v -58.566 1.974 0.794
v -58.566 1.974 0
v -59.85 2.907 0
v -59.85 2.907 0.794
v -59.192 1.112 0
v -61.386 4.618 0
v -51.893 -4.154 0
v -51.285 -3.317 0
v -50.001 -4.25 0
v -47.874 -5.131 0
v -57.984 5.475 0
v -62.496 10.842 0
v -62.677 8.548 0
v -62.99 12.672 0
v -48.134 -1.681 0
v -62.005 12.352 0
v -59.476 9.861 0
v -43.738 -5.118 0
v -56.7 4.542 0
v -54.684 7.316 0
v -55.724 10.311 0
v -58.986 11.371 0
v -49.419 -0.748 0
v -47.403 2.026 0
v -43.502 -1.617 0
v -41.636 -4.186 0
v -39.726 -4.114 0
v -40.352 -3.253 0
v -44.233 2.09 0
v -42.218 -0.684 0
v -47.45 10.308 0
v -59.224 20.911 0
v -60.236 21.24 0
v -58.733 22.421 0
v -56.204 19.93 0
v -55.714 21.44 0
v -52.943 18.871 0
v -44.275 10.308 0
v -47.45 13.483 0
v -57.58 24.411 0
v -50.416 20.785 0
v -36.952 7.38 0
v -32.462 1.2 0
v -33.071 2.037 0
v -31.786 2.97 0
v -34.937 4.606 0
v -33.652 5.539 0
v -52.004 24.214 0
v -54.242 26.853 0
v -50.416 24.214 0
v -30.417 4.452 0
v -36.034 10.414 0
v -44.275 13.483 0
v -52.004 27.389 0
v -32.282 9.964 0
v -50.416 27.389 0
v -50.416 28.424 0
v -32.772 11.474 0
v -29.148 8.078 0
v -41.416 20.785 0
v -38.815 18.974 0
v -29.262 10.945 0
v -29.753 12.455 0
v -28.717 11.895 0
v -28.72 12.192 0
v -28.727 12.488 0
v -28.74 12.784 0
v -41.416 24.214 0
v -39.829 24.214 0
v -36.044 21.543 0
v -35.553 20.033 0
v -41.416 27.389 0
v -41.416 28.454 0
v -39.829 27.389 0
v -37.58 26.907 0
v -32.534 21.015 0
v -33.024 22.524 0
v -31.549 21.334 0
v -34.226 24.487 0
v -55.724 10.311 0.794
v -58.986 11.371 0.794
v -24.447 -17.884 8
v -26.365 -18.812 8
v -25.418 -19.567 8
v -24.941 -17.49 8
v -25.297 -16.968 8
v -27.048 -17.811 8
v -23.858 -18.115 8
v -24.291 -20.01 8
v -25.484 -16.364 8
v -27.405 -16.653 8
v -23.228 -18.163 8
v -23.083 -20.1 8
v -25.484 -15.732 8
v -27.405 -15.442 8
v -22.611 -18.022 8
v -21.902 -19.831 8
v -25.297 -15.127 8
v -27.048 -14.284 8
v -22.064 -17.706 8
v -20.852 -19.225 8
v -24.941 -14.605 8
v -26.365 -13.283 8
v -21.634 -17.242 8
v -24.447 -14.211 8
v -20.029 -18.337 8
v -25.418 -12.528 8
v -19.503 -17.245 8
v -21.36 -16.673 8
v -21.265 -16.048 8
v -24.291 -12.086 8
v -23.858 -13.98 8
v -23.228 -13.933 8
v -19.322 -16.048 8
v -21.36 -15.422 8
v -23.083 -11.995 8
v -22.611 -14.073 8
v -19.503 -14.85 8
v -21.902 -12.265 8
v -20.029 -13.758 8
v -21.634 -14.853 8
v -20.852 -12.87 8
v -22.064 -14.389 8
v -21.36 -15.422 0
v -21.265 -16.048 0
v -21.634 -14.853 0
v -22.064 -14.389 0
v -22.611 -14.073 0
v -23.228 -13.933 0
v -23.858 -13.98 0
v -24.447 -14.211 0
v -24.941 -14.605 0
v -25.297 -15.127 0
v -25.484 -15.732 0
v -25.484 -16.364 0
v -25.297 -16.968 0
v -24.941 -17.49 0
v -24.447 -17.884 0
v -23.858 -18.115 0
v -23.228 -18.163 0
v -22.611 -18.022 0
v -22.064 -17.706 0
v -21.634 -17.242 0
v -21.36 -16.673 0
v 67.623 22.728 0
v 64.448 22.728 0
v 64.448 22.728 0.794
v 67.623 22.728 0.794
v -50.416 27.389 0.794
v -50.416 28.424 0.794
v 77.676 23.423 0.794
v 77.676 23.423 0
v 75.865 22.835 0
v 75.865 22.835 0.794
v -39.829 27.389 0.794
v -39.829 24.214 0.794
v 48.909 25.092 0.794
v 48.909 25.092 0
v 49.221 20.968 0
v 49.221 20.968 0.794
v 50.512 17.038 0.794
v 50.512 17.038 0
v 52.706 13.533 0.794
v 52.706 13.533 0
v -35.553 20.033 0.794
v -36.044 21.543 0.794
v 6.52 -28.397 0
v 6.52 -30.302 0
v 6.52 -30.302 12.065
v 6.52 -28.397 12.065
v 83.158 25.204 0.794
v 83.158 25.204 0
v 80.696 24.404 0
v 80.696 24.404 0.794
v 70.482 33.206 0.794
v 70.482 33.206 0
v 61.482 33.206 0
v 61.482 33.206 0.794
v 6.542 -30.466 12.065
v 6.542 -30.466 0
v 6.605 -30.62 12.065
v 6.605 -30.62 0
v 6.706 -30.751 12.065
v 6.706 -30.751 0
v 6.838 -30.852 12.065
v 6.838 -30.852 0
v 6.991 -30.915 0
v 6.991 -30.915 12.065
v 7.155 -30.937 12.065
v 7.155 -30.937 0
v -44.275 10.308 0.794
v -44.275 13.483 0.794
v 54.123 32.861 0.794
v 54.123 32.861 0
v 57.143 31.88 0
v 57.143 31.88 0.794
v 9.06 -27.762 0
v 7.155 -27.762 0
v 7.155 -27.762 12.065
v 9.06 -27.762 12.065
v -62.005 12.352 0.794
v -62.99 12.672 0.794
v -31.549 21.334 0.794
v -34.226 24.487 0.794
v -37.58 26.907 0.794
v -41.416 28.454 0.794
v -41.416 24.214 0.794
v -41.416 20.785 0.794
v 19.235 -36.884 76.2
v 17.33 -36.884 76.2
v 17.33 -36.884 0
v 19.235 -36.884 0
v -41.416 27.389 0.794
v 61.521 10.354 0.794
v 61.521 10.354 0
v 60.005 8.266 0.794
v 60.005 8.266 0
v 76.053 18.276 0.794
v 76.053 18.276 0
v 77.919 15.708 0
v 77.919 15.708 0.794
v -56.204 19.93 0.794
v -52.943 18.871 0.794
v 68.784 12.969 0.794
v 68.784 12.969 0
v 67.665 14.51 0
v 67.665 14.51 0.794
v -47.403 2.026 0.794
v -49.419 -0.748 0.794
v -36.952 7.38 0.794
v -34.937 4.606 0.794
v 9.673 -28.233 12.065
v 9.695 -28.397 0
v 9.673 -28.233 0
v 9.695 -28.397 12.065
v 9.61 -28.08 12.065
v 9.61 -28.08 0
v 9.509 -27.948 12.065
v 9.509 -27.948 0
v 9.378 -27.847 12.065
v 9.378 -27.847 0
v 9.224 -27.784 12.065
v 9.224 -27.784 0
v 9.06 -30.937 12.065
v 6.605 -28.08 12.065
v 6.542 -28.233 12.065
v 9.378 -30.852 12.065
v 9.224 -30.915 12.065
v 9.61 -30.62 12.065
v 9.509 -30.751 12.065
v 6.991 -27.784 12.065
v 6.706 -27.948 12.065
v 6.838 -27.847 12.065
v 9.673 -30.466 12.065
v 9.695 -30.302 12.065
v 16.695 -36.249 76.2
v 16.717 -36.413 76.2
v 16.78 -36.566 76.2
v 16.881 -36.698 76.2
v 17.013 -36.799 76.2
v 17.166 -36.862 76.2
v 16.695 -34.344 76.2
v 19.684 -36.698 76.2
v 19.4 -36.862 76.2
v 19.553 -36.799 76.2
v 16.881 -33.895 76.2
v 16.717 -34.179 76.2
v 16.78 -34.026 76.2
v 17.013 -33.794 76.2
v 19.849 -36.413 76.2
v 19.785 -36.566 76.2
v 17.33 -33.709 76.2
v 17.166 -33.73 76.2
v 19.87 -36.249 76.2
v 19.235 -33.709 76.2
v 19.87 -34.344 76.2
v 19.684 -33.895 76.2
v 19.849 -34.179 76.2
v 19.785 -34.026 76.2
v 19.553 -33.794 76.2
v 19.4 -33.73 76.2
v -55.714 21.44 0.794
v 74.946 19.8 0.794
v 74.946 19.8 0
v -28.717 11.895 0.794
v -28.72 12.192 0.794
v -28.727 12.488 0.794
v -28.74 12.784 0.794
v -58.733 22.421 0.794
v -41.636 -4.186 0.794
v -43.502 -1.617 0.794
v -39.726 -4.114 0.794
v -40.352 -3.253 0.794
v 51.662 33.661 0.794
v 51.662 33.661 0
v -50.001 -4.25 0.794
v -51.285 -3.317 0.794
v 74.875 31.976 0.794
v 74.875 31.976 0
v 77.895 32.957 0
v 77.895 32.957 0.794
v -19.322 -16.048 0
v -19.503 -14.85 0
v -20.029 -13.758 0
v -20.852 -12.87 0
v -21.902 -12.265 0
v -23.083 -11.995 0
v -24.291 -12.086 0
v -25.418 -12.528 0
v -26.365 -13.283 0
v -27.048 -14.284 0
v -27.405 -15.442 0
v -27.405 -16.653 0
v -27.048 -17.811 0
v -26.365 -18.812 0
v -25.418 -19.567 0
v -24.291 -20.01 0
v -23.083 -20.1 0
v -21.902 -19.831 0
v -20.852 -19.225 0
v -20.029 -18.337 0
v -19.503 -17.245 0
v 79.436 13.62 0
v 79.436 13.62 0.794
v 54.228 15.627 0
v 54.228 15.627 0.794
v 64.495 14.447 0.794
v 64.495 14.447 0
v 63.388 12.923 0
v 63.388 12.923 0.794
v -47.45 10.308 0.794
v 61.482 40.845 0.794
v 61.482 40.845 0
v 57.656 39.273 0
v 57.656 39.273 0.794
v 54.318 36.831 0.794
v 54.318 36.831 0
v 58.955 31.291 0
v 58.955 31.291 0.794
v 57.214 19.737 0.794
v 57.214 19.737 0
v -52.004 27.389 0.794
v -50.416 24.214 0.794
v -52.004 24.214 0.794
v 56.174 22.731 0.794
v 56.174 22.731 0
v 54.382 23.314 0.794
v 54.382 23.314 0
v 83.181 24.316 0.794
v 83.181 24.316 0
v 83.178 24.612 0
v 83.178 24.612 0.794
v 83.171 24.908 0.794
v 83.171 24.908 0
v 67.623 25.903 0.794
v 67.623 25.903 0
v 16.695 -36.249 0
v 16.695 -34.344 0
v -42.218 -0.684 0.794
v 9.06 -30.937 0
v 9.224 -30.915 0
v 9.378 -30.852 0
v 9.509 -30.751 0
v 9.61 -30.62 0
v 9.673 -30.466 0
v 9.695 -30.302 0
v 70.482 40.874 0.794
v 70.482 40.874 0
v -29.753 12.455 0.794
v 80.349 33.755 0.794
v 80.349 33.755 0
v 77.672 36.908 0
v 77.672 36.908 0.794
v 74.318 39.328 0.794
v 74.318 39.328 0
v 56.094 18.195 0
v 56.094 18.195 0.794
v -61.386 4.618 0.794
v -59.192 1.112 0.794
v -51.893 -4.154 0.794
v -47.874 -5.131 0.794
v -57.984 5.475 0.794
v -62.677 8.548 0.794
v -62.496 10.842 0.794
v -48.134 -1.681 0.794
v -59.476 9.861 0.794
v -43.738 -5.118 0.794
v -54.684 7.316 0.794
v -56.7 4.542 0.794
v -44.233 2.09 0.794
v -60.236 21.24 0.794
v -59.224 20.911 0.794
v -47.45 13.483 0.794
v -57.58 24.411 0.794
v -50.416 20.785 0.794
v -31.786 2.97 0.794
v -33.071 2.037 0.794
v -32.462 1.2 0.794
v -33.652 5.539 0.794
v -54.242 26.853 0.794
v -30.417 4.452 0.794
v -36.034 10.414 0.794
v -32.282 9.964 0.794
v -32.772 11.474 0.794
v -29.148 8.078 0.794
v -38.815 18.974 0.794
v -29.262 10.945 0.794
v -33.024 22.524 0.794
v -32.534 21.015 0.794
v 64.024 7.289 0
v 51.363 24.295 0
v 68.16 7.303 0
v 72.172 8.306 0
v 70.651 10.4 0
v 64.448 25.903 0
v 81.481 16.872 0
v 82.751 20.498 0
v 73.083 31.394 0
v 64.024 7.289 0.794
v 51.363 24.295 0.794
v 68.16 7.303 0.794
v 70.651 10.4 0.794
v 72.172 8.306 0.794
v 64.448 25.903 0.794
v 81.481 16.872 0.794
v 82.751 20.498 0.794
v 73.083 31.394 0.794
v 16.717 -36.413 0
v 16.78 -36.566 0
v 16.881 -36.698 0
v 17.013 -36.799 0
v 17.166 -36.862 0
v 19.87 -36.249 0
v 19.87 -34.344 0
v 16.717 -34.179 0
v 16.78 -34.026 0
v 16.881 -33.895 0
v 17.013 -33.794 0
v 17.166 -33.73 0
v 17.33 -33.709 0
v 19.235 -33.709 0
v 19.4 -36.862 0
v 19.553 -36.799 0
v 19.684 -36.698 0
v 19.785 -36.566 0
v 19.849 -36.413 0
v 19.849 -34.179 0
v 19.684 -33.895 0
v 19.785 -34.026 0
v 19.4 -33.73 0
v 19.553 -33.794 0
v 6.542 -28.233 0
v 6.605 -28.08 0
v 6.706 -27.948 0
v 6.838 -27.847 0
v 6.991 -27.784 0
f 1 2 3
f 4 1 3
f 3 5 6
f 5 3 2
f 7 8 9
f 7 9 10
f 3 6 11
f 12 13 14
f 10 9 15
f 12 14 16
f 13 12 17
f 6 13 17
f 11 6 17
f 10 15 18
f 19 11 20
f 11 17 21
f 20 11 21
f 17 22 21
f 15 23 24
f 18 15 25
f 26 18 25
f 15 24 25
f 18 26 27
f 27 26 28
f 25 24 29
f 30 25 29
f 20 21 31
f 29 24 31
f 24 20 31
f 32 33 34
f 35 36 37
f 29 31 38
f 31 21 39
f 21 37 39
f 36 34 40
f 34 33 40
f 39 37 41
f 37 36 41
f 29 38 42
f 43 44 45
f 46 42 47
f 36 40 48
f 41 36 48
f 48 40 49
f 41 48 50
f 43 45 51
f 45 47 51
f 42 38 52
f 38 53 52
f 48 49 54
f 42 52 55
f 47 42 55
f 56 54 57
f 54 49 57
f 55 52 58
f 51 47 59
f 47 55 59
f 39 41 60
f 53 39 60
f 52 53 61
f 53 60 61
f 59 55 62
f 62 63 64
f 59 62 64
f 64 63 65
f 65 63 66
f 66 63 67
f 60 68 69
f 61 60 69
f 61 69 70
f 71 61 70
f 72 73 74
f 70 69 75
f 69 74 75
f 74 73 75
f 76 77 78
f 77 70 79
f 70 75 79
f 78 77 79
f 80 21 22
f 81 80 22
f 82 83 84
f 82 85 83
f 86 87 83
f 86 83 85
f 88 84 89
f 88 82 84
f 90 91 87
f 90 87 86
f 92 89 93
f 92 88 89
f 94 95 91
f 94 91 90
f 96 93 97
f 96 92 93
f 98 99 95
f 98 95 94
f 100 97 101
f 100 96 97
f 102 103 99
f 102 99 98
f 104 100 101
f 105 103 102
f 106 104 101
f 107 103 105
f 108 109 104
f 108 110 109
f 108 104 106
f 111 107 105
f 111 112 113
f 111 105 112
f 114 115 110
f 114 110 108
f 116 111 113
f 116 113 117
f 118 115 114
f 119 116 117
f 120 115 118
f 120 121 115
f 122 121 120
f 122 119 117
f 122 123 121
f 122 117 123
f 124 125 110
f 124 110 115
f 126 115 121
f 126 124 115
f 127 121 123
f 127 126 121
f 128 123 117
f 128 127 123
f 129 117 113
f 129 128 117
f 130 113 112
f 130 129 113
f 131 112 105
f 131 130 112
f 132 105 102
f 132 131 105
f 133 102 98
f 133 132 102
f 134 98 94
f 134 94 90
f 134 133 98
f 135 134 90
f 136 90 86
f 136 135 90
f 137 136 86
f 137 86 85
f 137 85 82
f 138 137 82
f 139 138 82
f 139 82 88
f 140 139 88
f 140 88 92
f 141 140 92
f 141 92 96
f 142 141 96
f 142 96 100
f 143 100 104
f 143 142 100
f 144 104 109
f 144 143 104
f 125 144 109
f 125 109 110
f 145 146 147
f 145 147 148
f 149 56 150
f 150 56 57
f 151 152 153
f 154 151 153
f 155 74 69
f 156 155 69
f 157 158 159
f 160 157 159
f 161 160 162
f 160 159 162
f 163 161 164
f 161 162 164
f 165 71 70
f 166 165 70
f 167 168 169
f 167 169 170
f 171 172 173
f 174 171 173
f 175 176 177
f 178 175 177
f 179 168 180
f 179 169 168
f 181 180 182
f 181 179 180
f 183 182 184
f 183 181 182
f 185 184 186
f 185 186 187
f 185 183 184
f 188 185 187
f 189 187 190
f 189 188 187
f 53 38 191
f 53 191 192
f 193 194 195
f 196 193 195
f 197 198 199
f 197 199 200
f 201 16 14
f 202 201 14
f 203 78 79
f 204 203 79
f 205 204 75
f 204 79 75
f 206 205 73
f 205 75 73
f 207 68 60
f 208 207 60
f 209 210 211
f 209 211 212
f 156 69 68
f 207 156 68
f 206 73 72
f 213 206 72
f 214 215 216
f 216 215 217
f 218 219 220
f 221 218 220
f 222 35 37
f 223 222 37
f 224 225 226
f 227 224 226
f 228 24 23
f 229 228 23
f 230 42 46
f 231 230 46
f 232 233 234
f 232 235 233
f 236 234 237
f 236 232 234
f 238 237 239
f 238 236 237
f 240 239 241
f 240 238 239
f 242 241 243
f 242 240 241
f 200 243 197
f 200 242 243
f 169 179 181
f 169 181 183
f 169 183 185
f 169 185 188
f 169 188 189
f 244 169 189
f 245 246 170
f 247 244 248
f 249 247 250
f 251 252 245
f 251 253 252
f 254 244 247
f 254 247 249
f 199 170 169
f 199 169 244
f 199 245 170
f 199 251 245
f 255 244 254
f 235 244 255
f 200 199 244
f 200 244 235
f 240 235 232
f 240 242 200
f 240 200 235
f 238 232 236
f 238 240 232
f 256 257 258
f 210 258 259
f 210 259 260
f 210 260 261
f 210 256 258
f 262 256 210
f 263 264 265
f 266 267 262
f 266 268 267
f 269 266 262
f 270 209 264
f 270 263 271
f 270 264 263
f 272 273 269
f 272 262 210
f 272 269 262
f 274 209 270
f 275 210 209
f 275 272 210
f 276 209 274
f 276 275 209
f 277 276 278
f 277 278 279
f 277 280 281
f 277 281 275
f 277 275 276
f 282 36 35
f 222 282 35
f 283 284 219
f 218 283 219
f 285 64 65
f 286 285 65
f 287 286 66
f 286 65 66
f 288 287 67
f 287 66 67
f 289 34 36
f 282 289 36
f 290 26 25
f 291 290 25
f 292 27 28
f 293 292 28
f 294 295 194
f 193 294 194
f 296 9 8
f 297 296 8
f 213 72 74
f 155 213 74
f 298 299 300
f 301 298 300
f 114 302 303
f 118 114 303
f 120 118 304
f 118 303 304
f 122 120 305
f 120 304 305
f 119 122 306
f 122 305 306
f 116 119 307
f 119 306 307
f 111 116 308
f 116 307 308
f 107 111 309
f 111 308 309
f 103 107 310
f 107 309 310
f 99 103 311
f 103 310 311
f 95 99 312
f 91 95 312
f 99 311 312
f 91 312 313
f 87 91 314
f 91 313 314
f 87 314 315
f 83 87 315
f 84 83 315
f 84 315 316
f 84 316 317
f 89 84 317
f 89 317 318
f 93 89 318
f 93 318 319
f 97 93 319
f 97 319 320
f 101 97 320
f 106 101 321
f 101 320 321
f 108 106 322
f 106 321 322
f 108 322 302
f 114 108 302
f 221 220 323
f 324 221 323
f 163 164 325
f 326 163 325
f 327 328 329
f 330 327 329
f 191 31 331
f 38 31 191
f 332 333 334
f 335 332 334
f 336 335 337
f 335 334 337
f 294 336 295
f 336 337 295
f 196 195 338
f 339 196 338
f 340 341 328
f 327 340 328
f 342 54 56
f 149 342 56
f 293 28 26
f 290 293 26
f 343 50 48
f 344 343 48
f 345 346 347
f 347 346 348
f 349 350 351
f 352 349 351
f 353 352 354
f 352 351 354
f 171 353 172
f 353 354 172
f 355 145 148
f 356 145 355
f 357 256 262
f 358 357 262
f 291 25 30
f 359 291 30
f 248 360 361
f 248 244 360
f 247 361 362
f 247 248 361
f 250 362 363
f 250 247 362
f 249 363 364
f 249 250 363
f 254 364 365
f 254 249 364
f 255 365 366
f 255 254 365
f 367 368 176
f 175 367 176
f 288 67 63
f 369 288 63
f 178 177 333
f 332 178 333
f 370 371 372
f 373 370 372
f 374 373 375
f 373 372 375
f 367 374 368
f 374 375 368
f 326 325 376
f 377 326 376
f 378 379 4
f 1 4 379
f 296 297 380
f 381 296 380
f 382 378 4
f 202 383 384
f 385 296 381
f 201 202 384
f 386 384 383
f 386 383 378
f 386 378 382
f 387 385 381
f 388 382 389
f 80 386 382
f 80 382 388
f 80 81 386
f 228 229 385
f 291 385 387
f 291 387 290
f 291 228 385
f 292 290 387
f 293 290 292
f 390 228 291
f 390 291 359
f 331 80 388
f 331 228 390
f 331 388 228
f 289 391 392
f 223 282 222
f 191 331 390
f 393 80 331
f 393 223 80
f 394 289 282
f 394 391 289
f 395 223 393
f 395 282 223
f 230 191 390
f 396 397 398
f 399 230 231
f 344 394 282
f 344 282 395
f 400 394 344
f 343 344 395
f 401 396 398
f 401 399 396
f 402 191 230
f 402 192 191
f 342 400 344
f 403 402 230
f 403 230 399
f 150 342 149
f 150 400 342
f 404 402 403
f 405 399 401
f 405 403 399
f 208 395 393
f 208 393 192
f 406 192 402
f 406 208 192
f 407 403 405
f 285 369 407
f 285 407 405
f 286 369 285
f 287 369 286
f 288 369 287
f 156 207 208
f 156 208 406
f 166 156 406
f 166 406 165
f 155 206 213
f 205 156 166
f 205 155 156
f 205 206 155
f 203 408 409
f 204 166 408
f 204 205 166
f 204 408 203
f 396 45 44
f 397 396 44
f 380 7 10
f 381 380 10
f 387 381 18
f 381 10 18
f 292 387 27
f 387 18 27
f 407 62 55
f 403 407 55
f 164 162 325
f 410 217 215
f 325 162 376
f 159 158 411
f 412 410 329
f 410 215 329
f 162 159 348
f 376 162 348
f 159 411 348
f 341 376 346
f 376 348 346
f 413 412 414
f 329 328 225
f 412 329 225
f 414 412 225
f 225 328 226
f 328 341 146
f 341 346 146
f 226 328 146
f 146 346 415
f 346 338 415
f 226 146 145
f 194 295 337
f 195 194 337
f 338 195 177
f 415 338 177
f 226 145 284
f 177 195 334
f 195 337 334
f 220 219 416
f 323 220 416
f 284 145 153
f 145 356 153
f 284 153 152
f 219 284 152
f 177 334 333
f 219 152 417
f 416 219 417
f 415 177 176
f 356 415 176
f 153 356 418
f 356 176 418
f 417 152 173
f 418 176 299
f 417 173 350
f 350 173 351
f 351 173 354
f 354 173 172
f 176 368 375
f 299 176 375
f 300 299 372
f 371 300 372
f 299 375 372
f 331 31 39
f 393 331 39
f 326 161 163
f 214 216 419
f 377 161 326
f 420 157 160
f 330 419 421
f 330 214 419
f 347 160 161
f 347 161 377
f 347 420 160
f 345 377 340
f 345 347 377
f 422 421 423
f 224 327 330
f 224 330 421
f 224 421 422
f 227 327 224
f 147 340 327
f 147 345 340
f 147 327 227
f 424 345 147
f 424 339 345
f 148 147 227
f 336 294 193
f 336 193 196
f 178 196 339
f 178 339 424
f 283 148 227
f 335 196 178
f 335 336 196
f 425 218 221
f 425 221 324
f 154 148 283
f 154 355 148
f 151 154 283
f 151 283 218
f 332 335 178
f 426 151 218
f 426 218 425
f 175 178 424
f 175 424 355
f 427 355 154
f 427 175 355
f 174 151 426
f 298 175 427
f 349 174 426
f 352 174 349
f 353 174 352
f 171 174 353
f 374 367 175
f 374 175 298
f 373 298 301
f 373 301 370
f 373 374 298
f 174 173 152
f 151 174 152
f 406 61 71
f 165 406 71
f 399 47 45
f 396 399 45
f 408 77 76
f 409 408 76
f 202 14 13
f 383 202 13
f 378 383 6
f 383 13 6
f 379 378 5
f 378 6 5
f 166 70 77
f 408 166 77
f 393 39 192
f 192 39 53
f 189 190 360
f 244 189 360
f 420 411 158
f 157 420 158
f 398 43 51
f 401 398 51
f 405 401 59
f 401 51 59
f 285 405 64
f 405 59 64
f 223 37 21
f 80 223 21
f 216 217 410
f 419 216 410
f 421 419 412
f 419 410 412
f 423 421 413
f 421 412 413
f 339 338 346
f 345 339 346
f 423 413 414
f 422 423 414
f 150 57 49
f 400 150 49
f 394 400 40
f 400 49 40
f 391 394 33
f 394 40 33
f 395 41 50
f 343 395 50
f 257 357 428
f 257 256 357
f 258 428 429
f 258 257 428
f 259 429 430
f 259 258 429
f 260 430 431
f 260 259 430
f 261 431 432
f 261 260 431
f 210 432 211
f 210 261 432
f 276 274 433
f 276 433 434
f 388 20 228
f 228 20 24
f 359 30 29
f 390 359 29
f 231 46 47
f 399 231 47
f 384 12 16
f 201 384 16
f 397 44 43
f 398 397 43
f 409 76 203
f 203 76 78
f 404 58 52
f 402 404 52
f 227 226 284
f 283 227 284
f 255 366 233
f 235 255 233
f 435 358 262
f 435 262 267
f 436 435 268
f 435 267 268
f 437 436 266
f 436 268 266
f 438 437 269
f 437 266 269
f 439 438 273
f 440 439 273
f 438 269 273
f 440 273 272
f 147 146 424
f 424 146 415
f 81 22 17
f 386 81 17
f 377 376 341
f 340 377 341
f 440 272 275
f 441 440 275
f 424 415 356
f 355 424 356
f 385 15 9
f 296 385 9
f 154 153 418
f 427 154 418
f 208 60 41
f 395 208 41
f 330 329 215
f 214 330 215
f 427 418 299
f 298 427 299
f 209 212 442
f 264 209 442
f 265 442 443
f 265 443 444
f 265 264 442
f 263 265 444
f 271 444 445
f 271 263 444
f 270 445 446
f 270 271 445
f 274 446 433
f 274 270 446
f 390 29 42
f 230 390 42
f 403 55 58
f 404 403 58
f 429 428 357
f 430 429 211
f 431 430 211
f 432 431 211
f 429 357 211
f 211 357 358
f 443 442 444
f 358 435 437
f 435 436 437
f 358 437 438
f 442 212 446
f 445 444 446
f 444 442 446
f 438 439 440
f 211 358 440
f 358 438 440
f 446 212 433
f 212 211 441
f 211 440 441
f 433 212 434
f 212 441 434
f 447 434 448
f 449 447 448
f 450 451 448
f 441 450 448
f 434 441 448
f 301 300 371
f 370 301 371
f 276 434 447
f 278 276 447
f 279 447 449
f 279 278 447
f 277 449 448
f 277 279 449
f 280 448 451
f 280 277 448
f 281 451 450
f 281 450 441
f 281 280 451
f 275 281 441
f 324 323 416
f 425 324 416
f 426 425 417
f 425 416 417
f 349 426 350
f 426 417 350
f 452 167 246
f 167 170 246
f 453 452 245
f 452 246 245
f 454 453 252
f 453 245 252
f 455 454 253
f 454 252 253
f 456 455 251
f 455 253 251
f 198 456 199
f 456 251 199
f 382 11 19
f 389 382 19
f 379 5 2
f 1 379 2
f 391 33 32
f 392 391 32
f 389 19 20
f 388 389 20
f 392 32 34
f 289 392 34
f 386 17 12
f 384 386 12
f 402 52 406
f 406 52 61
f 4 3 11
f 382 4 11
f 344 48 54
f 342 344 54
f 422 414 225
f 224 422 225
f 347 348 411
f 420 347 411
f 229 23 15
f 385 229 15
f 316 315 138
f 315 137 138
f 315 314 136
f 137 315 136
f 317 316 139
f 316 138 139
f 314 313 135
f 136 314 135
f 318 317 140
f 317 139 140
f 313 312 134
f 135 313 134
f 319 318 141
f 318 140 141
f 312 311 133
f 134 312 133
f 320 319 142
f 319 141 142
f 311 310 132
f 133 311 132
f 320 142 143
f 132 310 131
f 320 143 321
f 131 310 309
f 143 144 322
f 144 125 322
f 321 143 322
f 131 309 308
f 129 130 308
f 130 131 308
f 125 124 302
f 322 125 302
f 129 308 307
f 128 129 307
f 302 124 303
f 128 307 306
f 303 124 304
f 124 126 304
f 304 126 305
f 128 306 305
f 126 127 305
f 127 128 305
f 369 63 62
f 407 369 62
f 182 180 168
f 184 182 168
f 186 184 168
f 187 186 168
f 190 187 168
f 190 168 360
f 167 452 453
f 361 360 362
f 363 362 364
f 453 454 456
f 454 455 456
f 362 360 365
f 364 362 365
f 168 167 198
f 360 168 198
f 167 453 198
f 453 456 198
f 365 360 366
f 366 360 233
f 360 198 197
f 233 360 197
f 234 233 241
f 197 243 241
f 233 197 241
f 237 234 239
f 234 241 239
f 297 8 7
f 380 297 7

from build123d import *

# Parameters (mm, degrees)
F0_W     = 3.175
F0_H     = 3.175
F0_W_2   = 1.5875
F1_DEPTH = 0.79375
F0_R     = 4.064
F0_R_2   = 2.1209
F2_DEPTH = 8
F3_DEPTH = 12.065
F4_DEPTH = 76.2
F5_R     = 0.635
F5_2_R   = 0.635


with BuildPart() as f1:
    # F0 (on Top) → F1 (new body)
    with BuildSketch(Plane.XY):
        with BuildLine():
            ThreePointArc((79.4359174406, 13.620231622), (82.2176024045, 18.6495635805), (83.1809139002, 24.3156011863))
            ThreePointArc((83.1809139002, 24.3156011863), (83.1751506376, 24.7601110941), (83.1578647245, 25.2043221595))
            Line((83.1578647245, 25.2043221595), (80.6959857074, 24.4044091771))
            Line((80.6959857074, 24.4044091771), (81.186550186, 22.8946069574))
            Line((81.186550186, 22.8946069574), (78.1669457467, 21.9134780003))
            Line((78.1669457467, 21.9134780003), (77.6763812682, 23.4232802199))
            Line((77.6763812682, 23.4232802199), (75.8645369763, 22.834576323))
            Line((75.8645369763, 22.834576323), (73.0833840269, 31.3940849696))
            Line((73.0833840269, 31.3940849696), (74.8750347538, 31.9762275796))
            Line((74.8750347538, 31.9762275796), (74.3844702753, 33.4860297992))
            Line((74.3844702753, 33.4860297992), (77.4040747145, 34.4671587563))
            Line((77.4040747145, 34.4671587563), (77.8946391931, 32.9573565367))
            Line((77.8946391931, 32.9573565367), (80.3486436372, 33.7547109153))
            ThreePointArc((80.3486436372, 33.7547109153), (76.0679539826, 38.2191689581), (70.481663809, 40.8741739734))
            Line((70.481663809, 40.8741739734), (70.481663809, 38.2856011863))
            Line((70.481663809, 38.2856011863), (72.069163809, 38.2856011863))
            Line((72.069163809, 38.2856011863), (72.069163809, 35.1106011863))
            Line((72.069163809, 35.1106011863), (70.481663809, 35.1106011863))
            Line((70.481663809, 35.1106011863), (70.481663809, 33.2055153572))
            Line((70.481663809, 33.2055153572), (61.481663809, 33.2055153572))
            Line((61.481663809, 33.2055153572), (61.481663809, 35.0893684155))
            Line((61.481663809, 35.0893684155), (59.894163809, 35.0893684155))
            Line((59.894163809, 35.0893684155), (59.894163809, 38.2643684155))
            Line((59.894163809, 38.2643684155), (61.481663809, 38.2643684155))
            Line((61.481663809, 38.2643684155), (61.481663809, 40.8446613866))
            ThreePointArc((61.481663809, 40.8446613866), (55.9129060448, 38.1530770023), (51.661587625, 33.6606410007))
            Line((51.661587625, 33.6606410007), (54.1234666421, 32.8607280183))
            Line((54.1234666421, 32.8607280183), (54.6140311207, 34.3705302379))
            Line((54.6140311207, 34.3705302379), (57.6336355599, 33.3894012808))
            Line((57.6336355599, 33.3894012808), (57.1430710814, 31.8795990611))
            Line((57.1430710814, 31.8795990611), (58.9549153732, 31.2908951642))
            Line((58.9549153732, 31.2908951642), (56.1737624238, 22.7313865175))
            Line((56.1737624238, 22.7313865175), (54.3821116969, 23.3135291275))
            Line((54.3821116969, 23.3135291275), (53.8915472184, 21.8037269079))
            Line((53.8915472184, 21.8037269079), (50.8719427791, 22.784855865))
            Line((50.8719427791, 22.784855865), (51.3625072577, 24.2946580846))
            Line((51.3625072577, 24.2946580846), (48.9085028136, 25.0920124632))
            ThreePointArc((48.9085028136, 25.0920124632), (49.7475108948, 18.9640637873), (52.7063417879, 13.5325806306))
            Line((52.7063417879, 13.5325806306), (54.2278666967, 15.6267800066))
            Line((54.2278666967, 15.6267800066), (52.9435522181, 16.5598890946))
            Line((52.9435522181, 16.5598890946), (54.8097703941, 19.1285180518))
            Line((54.8097703941, 19.1285180518), (56.0940848727, 18.1954089638))
            Line((56.0940848727, 18.1954089638), (57.2138662274, 19.7366557752))
            Line((57.2138662274, 19.7366557752), (64.4950191768, 14.4465885046))
            Line((64.4950191768, 14.4465885046), (63.3877181316, 12.9225193655))
            Line((63.3877181316, 12.9225193655), (64.6720326102, 11.9894102775))
            Line((64.6720326102, 11.9894102775), (62.8058144341, 9.4207813203))
            Line((62.8058144341, 9.4207813203), (61.5214999556, 10.3538904083))
            Line((61.5214999556, 10.3538904083), (60.0048418006, 8.2663895443))
            ThreePointArc((60.0048418006, 8.2663895443), (66.0921350758, 7.1706933656), (72.1721115545, 8.306288167))
            Line((72.1721115545, 8.306288167), (70.6505866457, 10.400487543))
            Line((70.6505866457, 10.400487543), (69.3662721672, 9.467378455))
            Line((69.3662721672, 9.467378455), (67.5000539911, 12.0360074122))
            Line((67.5000539911, 12.0360074122), (68.7843684697, 12.9691165002))
            Line((68.7843684697, 12.9691165002), (67.664587115, 14.5103633117))
            Line((67.664587115, 14.5103633117), (74.9457400644, 19.8004305823))
            Line((74.9457400644, 19.8004305823), (76.0530411096, 18.2763614432))
            Line((76.0530411096, 18.2763614432), (77.3373555881, 19.2094705312))
            Line((77.3373555881, 19.2094705312), (79.2035737642, 16.640841574))
            Line((79.2035737642, 16.640841574), (77.9192592856, 15.707732486))
            Line((77.9192592856, 15.707732486), (79.4359174406, 13.620231622))
        make_face()
        with Locations((66.0359139002, 24.3156011863)):
            Rectangle(F0_W, F0_H, mode=Mode.SUBTRACT)
        with Locations((60.687913809, 36.6768684155)):
            Rectangle(F0_W_2, F0_H)
        with Locations((71.275413809, 36.6981011863)):
            Rectangle(F0_W_2, F0_H)
        Polygon((74.8750347538, 31.9762275796), (77.8946391931, 32.9573565367), (77.4040747145, 34.4671587563), (74.3844702753, 33.4860297992), align=None)
        Polygon((81.186550186, 22.8946069574), (80.6959857074, 24.4044091771), (77.6763812682, 23.4232802199), (78.1669457467, 21.9134780003), align=None)
        Polygon((76.0530411096, 18.2763614432), (77.9192592856, 15.707732486), (79.2035737642, 16.640841574), (77.3373555881, 19.2094705312), align=None)
        Polygon((69.3662721672, 9.467378455), (70.6505866457, 10.400487543), (68.7843684697, 12.9691165002), (67.5000539911, 12.0360074122), align=None)
        Polygon((63.3877181316, 12.9225193655), (61.5214999556, 10.3538904083), (62.8058144341, 9.4207813203), (64.6720326102, 11.9894102775), align=None)
        Polygon((52.9435522181, 16.5598890946), (54.2278666967, 15.6267800066), (56.0940848727, 18.1954089638), (54.8097703941, 19.1285180518), align=None)
        Polygon((54.3821116969, 23.3135291275), (51.3625072577, 24.2946580846), (50.8719427791, 22.784855865), (53.8915472184, 21.8037269079), align=None)
        Polygon((54.6140311207, 34.3705302379), (54.1234666421, 32.8607280183), (57.1430710814, 31.8795990611), (57.6336355599, 33.3894012808), align=None)
    extrude(amount=F1_DEPTH)


with BuildPart() as f1b:
    # F0 (on Top) → F1, piece 2 (new body)
    with BuildSketch(Plane.XY):
        with BuildLine():
            ThreePointArc((-32.4621521639, 1.1999585457), (-29.6804672, 6.2292905042), (-28.7171557043, 11.89532811))
            ThreePointArc((-28.7171557043, 11.89532811), (-28.7229189669, 12.3398380178), (-28.7402048799, 12.7840490832))
            Line((-28.7402048799, 12.7840490832), (-29.7526737663, 12.4550780002))
            Line((-29.7526737663, 12.4550780002), (-29.2621092877, 10.9452757806))
            Line((-29.2621092877, 10.9452757806), (-32.2817137269, 9.9641468234))
            Line((-32.2817137269, 9.9641468234), (-32.7722782055, 11.4739490431))
            Line((-32.7722782055, 11.4739490431), (-36.0335326282, 10.4143032467))
            Line((-36.0335326282, 10.4143032467), (-38.8146855776, 18.9738118934))
            Line((-38.8146855776, 18.9738118934), (-35.5534311549, 20.0334576897))
            Line((-35.5534311549, 20.0334576897), (-36.0439956334, 21.5432599093))
            Line((-36.0439956334, 21.5432599093), (-33.0243911942, 22.5243888665))
            Line((-33.0243911942, 22.5243888665), (-32.5338267156, 21.0145866469))
            Line((-32.5338267156, 21.0145866469), (-31.5494259673, 21.334437839))
            ThreePointArc((-31.5494259673, 21.334437839), (-35.8301156219, 25.7988958818), (-41.4164057955, 28.4539008971))
            Line((-41.4164057955, 28.4539008971), (-41.4164057955, 27.38932811))
            Line((-41.4164057955, 27.38932811), (-39.8289057955, 27.38932811))
            Line((-39.8289057955, 27.38932811), (-39.8289057955, 24.21432811))
            Line((-39.8289057955, 24.21432811), (-41.4164057955, 24.21432811))
            Line((-41.4164057955, 24.21432811), (-41.4164057955, 20.7852422809))
            Line((-41.4164057955, 20.7852422809), (-50.4164057955, 20.7852422809))
            Line((-50.4164057955, 20.7852422809), (-50.4164057955, 24.21432811))
            Line((-50.4164057955, 24.21432811), (-52.0039057955, 24.21432811))
            Line((-52.0039057955, 24.21432811), (-52.0039057955, 27.38932811))
            Line((-52.0039057955, 27.38932811), (-50.4164057955, 27.38932811))
            Line((-50.4164057955, 27.38932811), (-50.4164057955, 28.4243883103))
            ThreePointArc((-50.4164057955, 28.4243883103), (-55.9851635597, 25.732803926), (-60.2364819795, 21.2403679244))
            Line((-60.2364819795, 21.2403679244), (-59.2240130932, 20.9113968414))
            Line((-59.2240130932, 20.9113968414), (-58.7334486146, 22.421199061))
            Line((-58.7334486146, 22.421199061), (-55.7138441754, 21.4400701039))
            Line((-55.7138441754, 21.4400701039), (-56.204408654, 19.9302678843))
            Line((-56.204408654, 19.9302678843), (-52.9431542313, 18.8706220879))
            Line((-52.9431542313, 18.8706220879), (-55.7243071807, 10.3111134413))
            Line((-55.7243071807, 10.3111134413), (-58.9855616034, 11.3707592376))
            Line((-58.9855616034, 11.3707592376), (-59.4761260819, 9.860957018))
            Line((-59.4761260819, 9.860957018), (-62.4957305212, 10.8420859751))
            Line((-62.4957305212, 10.8420859751), (-62.0051660426, 12.3518881948))
            Line((-62.0051660426, 12.3518881948), (-62.9895667909, 12.6717393869))
            ThreePointArc((-62.9895667909, 12.6717393869), (-62.1505587097, 6.543790711), (-59.1917278166, 1.1123075543))
            Line((-59.1917278166, 1.1123075543), (-58.5659876323, 1.9735650309))
            Line((-58.5659876323, 1.9735650309), (-59.8503021109, 2.9066741189))
            Line((-59.8503021109, 2.9066741189), (-57.9840839349, 5.4753030761))
            Line((-57.9840839349, 5.4753030761), (-56.6997694563, 4.5421939881))
            Line((-56.6997694563, 4.5421939881), (-54.6842033771, 7.316382699))
            Line((-54.6842033771, 7.316382699), (-47.4030504277, 2.0263154283))
            Line((-47.4030504277, 2.0263154283), (-49.4186165069, -0.7478732826))
            Line((-49.4186165069, -0.7478732826), (-48.1343020283, -1.6809823706))
            Line((-48.1343020283, -1.6809823706), (-50.0005202044, -4.2496113277))
            Line((-50.0005202044, -4.2496113277), (-51.2848346829, -3.3165022397))
            Line((-51.2848346829, -3.3165022397), (-51.8932278039, -4.153883532))
            ThreePointArc((-51.8932278039, -4.153883532), (-45.8059345287, -5.2495797107), (-39.72595805, -4.1139849092))
            Line((-39.72595805, -4.1139849092), (-40.3516982343, -3.2527274327))
            Line((-40.3516982343, -3.2527274327), (-41.6360127128, -4.1858365207))
            Line((-41.6360127128, -4.1858365207), (-43.5022308889, -1.6172075635))
            Line((-43.5022308889, -1.6172075635), (-42.2179164103, -0.6840984755))
            Line((-42.2179164103, -0.6840984755), (-44.2334824895, 2.0900902354))
            Line((-44.2334824895, 2.0900902354), (-36.9523295401, 7.380157506))
            Line((-36.9523295401, 7.380157506), (-34.9367634609, 4.6059687951))
            Line((-34.9367634609, 4.6059687951), (-33.6524489824, 5.5390778831))
            Line((-33.6524489824, 5.5390778831), (-31.7862308063, 2.970448926))
            Line((-31.7862308063, 2.970448926), (-33.0705452849, 2.037339838))
            Line((-33.0705452849, 2.037339838), (-32.4621521639, 1.1999585457))
        make_face()
        with Locations((-45.8621557043, 11.89532811)):
            Rectangle(F0_W, F0_H, mode=Mode.SUBTRACT)
    extrude(amount=F1_DEPTH)


with BuildPart() as f2:
    # F0 (on Top) → F2 (new body)
    with BuildSketch(Plane.XY):
        with Locations((-23.3863368352, -16.047612899)):
            Circle(F0_R)
        with Locations((-23.3863368352, -16.047612899)):
            Circle(F0_R_2, mode=Mode.SUBTRACT)
    extrude(amount=F2_DEPTH)


with BuildPart() as f3:
    # F0 (on Top) → F3 (new body)
    with BuildSketch(Plane.XY):
        with Locations((8.1075645477, -29.3496128678)):
            Rectangle(F0_W, F0_H)
    extrude(amount=F3_DEPTH)

    # F5
    f5_edges = [f3.edges().sort_by_distance(p)[0] for p in [
        (9.695065, -30.937113, 6.0325),
        (6.520065, -30.937113, 6.0325),
        (9.695065, -27.762113, 6.0325),
        (6.520065, -27.762113, 6.0325),
    ]]
    fillet(f5_edges, radius=F5_R)


with BuildPart() as f4:
    # F0 (on Top) → F4 (new body)
    with BuildSketch(Plane.XY):
        with Locations((18.2828865945, -35.2963171899)):
            Rectangle(F0_W, F0_H)
    extrude(amount=F4_DEPTH)

    # F5#2
    f5_2_edges = [f4.edges().sort_by_distance(p)[0] for p in [
        (19.870387, -36.883817, 38.1),
        (16.695387, -36.883817, 38.1),
        (19.870387, -33.708817, 38.1),
        (16.695387, -33.708817, 38.1),
    ]]
    fillet(f5_2_edges, radius=F5_2_R)


solid = Compound([f1.part, f1b.part, f2.part, f3.part, f4.part])
